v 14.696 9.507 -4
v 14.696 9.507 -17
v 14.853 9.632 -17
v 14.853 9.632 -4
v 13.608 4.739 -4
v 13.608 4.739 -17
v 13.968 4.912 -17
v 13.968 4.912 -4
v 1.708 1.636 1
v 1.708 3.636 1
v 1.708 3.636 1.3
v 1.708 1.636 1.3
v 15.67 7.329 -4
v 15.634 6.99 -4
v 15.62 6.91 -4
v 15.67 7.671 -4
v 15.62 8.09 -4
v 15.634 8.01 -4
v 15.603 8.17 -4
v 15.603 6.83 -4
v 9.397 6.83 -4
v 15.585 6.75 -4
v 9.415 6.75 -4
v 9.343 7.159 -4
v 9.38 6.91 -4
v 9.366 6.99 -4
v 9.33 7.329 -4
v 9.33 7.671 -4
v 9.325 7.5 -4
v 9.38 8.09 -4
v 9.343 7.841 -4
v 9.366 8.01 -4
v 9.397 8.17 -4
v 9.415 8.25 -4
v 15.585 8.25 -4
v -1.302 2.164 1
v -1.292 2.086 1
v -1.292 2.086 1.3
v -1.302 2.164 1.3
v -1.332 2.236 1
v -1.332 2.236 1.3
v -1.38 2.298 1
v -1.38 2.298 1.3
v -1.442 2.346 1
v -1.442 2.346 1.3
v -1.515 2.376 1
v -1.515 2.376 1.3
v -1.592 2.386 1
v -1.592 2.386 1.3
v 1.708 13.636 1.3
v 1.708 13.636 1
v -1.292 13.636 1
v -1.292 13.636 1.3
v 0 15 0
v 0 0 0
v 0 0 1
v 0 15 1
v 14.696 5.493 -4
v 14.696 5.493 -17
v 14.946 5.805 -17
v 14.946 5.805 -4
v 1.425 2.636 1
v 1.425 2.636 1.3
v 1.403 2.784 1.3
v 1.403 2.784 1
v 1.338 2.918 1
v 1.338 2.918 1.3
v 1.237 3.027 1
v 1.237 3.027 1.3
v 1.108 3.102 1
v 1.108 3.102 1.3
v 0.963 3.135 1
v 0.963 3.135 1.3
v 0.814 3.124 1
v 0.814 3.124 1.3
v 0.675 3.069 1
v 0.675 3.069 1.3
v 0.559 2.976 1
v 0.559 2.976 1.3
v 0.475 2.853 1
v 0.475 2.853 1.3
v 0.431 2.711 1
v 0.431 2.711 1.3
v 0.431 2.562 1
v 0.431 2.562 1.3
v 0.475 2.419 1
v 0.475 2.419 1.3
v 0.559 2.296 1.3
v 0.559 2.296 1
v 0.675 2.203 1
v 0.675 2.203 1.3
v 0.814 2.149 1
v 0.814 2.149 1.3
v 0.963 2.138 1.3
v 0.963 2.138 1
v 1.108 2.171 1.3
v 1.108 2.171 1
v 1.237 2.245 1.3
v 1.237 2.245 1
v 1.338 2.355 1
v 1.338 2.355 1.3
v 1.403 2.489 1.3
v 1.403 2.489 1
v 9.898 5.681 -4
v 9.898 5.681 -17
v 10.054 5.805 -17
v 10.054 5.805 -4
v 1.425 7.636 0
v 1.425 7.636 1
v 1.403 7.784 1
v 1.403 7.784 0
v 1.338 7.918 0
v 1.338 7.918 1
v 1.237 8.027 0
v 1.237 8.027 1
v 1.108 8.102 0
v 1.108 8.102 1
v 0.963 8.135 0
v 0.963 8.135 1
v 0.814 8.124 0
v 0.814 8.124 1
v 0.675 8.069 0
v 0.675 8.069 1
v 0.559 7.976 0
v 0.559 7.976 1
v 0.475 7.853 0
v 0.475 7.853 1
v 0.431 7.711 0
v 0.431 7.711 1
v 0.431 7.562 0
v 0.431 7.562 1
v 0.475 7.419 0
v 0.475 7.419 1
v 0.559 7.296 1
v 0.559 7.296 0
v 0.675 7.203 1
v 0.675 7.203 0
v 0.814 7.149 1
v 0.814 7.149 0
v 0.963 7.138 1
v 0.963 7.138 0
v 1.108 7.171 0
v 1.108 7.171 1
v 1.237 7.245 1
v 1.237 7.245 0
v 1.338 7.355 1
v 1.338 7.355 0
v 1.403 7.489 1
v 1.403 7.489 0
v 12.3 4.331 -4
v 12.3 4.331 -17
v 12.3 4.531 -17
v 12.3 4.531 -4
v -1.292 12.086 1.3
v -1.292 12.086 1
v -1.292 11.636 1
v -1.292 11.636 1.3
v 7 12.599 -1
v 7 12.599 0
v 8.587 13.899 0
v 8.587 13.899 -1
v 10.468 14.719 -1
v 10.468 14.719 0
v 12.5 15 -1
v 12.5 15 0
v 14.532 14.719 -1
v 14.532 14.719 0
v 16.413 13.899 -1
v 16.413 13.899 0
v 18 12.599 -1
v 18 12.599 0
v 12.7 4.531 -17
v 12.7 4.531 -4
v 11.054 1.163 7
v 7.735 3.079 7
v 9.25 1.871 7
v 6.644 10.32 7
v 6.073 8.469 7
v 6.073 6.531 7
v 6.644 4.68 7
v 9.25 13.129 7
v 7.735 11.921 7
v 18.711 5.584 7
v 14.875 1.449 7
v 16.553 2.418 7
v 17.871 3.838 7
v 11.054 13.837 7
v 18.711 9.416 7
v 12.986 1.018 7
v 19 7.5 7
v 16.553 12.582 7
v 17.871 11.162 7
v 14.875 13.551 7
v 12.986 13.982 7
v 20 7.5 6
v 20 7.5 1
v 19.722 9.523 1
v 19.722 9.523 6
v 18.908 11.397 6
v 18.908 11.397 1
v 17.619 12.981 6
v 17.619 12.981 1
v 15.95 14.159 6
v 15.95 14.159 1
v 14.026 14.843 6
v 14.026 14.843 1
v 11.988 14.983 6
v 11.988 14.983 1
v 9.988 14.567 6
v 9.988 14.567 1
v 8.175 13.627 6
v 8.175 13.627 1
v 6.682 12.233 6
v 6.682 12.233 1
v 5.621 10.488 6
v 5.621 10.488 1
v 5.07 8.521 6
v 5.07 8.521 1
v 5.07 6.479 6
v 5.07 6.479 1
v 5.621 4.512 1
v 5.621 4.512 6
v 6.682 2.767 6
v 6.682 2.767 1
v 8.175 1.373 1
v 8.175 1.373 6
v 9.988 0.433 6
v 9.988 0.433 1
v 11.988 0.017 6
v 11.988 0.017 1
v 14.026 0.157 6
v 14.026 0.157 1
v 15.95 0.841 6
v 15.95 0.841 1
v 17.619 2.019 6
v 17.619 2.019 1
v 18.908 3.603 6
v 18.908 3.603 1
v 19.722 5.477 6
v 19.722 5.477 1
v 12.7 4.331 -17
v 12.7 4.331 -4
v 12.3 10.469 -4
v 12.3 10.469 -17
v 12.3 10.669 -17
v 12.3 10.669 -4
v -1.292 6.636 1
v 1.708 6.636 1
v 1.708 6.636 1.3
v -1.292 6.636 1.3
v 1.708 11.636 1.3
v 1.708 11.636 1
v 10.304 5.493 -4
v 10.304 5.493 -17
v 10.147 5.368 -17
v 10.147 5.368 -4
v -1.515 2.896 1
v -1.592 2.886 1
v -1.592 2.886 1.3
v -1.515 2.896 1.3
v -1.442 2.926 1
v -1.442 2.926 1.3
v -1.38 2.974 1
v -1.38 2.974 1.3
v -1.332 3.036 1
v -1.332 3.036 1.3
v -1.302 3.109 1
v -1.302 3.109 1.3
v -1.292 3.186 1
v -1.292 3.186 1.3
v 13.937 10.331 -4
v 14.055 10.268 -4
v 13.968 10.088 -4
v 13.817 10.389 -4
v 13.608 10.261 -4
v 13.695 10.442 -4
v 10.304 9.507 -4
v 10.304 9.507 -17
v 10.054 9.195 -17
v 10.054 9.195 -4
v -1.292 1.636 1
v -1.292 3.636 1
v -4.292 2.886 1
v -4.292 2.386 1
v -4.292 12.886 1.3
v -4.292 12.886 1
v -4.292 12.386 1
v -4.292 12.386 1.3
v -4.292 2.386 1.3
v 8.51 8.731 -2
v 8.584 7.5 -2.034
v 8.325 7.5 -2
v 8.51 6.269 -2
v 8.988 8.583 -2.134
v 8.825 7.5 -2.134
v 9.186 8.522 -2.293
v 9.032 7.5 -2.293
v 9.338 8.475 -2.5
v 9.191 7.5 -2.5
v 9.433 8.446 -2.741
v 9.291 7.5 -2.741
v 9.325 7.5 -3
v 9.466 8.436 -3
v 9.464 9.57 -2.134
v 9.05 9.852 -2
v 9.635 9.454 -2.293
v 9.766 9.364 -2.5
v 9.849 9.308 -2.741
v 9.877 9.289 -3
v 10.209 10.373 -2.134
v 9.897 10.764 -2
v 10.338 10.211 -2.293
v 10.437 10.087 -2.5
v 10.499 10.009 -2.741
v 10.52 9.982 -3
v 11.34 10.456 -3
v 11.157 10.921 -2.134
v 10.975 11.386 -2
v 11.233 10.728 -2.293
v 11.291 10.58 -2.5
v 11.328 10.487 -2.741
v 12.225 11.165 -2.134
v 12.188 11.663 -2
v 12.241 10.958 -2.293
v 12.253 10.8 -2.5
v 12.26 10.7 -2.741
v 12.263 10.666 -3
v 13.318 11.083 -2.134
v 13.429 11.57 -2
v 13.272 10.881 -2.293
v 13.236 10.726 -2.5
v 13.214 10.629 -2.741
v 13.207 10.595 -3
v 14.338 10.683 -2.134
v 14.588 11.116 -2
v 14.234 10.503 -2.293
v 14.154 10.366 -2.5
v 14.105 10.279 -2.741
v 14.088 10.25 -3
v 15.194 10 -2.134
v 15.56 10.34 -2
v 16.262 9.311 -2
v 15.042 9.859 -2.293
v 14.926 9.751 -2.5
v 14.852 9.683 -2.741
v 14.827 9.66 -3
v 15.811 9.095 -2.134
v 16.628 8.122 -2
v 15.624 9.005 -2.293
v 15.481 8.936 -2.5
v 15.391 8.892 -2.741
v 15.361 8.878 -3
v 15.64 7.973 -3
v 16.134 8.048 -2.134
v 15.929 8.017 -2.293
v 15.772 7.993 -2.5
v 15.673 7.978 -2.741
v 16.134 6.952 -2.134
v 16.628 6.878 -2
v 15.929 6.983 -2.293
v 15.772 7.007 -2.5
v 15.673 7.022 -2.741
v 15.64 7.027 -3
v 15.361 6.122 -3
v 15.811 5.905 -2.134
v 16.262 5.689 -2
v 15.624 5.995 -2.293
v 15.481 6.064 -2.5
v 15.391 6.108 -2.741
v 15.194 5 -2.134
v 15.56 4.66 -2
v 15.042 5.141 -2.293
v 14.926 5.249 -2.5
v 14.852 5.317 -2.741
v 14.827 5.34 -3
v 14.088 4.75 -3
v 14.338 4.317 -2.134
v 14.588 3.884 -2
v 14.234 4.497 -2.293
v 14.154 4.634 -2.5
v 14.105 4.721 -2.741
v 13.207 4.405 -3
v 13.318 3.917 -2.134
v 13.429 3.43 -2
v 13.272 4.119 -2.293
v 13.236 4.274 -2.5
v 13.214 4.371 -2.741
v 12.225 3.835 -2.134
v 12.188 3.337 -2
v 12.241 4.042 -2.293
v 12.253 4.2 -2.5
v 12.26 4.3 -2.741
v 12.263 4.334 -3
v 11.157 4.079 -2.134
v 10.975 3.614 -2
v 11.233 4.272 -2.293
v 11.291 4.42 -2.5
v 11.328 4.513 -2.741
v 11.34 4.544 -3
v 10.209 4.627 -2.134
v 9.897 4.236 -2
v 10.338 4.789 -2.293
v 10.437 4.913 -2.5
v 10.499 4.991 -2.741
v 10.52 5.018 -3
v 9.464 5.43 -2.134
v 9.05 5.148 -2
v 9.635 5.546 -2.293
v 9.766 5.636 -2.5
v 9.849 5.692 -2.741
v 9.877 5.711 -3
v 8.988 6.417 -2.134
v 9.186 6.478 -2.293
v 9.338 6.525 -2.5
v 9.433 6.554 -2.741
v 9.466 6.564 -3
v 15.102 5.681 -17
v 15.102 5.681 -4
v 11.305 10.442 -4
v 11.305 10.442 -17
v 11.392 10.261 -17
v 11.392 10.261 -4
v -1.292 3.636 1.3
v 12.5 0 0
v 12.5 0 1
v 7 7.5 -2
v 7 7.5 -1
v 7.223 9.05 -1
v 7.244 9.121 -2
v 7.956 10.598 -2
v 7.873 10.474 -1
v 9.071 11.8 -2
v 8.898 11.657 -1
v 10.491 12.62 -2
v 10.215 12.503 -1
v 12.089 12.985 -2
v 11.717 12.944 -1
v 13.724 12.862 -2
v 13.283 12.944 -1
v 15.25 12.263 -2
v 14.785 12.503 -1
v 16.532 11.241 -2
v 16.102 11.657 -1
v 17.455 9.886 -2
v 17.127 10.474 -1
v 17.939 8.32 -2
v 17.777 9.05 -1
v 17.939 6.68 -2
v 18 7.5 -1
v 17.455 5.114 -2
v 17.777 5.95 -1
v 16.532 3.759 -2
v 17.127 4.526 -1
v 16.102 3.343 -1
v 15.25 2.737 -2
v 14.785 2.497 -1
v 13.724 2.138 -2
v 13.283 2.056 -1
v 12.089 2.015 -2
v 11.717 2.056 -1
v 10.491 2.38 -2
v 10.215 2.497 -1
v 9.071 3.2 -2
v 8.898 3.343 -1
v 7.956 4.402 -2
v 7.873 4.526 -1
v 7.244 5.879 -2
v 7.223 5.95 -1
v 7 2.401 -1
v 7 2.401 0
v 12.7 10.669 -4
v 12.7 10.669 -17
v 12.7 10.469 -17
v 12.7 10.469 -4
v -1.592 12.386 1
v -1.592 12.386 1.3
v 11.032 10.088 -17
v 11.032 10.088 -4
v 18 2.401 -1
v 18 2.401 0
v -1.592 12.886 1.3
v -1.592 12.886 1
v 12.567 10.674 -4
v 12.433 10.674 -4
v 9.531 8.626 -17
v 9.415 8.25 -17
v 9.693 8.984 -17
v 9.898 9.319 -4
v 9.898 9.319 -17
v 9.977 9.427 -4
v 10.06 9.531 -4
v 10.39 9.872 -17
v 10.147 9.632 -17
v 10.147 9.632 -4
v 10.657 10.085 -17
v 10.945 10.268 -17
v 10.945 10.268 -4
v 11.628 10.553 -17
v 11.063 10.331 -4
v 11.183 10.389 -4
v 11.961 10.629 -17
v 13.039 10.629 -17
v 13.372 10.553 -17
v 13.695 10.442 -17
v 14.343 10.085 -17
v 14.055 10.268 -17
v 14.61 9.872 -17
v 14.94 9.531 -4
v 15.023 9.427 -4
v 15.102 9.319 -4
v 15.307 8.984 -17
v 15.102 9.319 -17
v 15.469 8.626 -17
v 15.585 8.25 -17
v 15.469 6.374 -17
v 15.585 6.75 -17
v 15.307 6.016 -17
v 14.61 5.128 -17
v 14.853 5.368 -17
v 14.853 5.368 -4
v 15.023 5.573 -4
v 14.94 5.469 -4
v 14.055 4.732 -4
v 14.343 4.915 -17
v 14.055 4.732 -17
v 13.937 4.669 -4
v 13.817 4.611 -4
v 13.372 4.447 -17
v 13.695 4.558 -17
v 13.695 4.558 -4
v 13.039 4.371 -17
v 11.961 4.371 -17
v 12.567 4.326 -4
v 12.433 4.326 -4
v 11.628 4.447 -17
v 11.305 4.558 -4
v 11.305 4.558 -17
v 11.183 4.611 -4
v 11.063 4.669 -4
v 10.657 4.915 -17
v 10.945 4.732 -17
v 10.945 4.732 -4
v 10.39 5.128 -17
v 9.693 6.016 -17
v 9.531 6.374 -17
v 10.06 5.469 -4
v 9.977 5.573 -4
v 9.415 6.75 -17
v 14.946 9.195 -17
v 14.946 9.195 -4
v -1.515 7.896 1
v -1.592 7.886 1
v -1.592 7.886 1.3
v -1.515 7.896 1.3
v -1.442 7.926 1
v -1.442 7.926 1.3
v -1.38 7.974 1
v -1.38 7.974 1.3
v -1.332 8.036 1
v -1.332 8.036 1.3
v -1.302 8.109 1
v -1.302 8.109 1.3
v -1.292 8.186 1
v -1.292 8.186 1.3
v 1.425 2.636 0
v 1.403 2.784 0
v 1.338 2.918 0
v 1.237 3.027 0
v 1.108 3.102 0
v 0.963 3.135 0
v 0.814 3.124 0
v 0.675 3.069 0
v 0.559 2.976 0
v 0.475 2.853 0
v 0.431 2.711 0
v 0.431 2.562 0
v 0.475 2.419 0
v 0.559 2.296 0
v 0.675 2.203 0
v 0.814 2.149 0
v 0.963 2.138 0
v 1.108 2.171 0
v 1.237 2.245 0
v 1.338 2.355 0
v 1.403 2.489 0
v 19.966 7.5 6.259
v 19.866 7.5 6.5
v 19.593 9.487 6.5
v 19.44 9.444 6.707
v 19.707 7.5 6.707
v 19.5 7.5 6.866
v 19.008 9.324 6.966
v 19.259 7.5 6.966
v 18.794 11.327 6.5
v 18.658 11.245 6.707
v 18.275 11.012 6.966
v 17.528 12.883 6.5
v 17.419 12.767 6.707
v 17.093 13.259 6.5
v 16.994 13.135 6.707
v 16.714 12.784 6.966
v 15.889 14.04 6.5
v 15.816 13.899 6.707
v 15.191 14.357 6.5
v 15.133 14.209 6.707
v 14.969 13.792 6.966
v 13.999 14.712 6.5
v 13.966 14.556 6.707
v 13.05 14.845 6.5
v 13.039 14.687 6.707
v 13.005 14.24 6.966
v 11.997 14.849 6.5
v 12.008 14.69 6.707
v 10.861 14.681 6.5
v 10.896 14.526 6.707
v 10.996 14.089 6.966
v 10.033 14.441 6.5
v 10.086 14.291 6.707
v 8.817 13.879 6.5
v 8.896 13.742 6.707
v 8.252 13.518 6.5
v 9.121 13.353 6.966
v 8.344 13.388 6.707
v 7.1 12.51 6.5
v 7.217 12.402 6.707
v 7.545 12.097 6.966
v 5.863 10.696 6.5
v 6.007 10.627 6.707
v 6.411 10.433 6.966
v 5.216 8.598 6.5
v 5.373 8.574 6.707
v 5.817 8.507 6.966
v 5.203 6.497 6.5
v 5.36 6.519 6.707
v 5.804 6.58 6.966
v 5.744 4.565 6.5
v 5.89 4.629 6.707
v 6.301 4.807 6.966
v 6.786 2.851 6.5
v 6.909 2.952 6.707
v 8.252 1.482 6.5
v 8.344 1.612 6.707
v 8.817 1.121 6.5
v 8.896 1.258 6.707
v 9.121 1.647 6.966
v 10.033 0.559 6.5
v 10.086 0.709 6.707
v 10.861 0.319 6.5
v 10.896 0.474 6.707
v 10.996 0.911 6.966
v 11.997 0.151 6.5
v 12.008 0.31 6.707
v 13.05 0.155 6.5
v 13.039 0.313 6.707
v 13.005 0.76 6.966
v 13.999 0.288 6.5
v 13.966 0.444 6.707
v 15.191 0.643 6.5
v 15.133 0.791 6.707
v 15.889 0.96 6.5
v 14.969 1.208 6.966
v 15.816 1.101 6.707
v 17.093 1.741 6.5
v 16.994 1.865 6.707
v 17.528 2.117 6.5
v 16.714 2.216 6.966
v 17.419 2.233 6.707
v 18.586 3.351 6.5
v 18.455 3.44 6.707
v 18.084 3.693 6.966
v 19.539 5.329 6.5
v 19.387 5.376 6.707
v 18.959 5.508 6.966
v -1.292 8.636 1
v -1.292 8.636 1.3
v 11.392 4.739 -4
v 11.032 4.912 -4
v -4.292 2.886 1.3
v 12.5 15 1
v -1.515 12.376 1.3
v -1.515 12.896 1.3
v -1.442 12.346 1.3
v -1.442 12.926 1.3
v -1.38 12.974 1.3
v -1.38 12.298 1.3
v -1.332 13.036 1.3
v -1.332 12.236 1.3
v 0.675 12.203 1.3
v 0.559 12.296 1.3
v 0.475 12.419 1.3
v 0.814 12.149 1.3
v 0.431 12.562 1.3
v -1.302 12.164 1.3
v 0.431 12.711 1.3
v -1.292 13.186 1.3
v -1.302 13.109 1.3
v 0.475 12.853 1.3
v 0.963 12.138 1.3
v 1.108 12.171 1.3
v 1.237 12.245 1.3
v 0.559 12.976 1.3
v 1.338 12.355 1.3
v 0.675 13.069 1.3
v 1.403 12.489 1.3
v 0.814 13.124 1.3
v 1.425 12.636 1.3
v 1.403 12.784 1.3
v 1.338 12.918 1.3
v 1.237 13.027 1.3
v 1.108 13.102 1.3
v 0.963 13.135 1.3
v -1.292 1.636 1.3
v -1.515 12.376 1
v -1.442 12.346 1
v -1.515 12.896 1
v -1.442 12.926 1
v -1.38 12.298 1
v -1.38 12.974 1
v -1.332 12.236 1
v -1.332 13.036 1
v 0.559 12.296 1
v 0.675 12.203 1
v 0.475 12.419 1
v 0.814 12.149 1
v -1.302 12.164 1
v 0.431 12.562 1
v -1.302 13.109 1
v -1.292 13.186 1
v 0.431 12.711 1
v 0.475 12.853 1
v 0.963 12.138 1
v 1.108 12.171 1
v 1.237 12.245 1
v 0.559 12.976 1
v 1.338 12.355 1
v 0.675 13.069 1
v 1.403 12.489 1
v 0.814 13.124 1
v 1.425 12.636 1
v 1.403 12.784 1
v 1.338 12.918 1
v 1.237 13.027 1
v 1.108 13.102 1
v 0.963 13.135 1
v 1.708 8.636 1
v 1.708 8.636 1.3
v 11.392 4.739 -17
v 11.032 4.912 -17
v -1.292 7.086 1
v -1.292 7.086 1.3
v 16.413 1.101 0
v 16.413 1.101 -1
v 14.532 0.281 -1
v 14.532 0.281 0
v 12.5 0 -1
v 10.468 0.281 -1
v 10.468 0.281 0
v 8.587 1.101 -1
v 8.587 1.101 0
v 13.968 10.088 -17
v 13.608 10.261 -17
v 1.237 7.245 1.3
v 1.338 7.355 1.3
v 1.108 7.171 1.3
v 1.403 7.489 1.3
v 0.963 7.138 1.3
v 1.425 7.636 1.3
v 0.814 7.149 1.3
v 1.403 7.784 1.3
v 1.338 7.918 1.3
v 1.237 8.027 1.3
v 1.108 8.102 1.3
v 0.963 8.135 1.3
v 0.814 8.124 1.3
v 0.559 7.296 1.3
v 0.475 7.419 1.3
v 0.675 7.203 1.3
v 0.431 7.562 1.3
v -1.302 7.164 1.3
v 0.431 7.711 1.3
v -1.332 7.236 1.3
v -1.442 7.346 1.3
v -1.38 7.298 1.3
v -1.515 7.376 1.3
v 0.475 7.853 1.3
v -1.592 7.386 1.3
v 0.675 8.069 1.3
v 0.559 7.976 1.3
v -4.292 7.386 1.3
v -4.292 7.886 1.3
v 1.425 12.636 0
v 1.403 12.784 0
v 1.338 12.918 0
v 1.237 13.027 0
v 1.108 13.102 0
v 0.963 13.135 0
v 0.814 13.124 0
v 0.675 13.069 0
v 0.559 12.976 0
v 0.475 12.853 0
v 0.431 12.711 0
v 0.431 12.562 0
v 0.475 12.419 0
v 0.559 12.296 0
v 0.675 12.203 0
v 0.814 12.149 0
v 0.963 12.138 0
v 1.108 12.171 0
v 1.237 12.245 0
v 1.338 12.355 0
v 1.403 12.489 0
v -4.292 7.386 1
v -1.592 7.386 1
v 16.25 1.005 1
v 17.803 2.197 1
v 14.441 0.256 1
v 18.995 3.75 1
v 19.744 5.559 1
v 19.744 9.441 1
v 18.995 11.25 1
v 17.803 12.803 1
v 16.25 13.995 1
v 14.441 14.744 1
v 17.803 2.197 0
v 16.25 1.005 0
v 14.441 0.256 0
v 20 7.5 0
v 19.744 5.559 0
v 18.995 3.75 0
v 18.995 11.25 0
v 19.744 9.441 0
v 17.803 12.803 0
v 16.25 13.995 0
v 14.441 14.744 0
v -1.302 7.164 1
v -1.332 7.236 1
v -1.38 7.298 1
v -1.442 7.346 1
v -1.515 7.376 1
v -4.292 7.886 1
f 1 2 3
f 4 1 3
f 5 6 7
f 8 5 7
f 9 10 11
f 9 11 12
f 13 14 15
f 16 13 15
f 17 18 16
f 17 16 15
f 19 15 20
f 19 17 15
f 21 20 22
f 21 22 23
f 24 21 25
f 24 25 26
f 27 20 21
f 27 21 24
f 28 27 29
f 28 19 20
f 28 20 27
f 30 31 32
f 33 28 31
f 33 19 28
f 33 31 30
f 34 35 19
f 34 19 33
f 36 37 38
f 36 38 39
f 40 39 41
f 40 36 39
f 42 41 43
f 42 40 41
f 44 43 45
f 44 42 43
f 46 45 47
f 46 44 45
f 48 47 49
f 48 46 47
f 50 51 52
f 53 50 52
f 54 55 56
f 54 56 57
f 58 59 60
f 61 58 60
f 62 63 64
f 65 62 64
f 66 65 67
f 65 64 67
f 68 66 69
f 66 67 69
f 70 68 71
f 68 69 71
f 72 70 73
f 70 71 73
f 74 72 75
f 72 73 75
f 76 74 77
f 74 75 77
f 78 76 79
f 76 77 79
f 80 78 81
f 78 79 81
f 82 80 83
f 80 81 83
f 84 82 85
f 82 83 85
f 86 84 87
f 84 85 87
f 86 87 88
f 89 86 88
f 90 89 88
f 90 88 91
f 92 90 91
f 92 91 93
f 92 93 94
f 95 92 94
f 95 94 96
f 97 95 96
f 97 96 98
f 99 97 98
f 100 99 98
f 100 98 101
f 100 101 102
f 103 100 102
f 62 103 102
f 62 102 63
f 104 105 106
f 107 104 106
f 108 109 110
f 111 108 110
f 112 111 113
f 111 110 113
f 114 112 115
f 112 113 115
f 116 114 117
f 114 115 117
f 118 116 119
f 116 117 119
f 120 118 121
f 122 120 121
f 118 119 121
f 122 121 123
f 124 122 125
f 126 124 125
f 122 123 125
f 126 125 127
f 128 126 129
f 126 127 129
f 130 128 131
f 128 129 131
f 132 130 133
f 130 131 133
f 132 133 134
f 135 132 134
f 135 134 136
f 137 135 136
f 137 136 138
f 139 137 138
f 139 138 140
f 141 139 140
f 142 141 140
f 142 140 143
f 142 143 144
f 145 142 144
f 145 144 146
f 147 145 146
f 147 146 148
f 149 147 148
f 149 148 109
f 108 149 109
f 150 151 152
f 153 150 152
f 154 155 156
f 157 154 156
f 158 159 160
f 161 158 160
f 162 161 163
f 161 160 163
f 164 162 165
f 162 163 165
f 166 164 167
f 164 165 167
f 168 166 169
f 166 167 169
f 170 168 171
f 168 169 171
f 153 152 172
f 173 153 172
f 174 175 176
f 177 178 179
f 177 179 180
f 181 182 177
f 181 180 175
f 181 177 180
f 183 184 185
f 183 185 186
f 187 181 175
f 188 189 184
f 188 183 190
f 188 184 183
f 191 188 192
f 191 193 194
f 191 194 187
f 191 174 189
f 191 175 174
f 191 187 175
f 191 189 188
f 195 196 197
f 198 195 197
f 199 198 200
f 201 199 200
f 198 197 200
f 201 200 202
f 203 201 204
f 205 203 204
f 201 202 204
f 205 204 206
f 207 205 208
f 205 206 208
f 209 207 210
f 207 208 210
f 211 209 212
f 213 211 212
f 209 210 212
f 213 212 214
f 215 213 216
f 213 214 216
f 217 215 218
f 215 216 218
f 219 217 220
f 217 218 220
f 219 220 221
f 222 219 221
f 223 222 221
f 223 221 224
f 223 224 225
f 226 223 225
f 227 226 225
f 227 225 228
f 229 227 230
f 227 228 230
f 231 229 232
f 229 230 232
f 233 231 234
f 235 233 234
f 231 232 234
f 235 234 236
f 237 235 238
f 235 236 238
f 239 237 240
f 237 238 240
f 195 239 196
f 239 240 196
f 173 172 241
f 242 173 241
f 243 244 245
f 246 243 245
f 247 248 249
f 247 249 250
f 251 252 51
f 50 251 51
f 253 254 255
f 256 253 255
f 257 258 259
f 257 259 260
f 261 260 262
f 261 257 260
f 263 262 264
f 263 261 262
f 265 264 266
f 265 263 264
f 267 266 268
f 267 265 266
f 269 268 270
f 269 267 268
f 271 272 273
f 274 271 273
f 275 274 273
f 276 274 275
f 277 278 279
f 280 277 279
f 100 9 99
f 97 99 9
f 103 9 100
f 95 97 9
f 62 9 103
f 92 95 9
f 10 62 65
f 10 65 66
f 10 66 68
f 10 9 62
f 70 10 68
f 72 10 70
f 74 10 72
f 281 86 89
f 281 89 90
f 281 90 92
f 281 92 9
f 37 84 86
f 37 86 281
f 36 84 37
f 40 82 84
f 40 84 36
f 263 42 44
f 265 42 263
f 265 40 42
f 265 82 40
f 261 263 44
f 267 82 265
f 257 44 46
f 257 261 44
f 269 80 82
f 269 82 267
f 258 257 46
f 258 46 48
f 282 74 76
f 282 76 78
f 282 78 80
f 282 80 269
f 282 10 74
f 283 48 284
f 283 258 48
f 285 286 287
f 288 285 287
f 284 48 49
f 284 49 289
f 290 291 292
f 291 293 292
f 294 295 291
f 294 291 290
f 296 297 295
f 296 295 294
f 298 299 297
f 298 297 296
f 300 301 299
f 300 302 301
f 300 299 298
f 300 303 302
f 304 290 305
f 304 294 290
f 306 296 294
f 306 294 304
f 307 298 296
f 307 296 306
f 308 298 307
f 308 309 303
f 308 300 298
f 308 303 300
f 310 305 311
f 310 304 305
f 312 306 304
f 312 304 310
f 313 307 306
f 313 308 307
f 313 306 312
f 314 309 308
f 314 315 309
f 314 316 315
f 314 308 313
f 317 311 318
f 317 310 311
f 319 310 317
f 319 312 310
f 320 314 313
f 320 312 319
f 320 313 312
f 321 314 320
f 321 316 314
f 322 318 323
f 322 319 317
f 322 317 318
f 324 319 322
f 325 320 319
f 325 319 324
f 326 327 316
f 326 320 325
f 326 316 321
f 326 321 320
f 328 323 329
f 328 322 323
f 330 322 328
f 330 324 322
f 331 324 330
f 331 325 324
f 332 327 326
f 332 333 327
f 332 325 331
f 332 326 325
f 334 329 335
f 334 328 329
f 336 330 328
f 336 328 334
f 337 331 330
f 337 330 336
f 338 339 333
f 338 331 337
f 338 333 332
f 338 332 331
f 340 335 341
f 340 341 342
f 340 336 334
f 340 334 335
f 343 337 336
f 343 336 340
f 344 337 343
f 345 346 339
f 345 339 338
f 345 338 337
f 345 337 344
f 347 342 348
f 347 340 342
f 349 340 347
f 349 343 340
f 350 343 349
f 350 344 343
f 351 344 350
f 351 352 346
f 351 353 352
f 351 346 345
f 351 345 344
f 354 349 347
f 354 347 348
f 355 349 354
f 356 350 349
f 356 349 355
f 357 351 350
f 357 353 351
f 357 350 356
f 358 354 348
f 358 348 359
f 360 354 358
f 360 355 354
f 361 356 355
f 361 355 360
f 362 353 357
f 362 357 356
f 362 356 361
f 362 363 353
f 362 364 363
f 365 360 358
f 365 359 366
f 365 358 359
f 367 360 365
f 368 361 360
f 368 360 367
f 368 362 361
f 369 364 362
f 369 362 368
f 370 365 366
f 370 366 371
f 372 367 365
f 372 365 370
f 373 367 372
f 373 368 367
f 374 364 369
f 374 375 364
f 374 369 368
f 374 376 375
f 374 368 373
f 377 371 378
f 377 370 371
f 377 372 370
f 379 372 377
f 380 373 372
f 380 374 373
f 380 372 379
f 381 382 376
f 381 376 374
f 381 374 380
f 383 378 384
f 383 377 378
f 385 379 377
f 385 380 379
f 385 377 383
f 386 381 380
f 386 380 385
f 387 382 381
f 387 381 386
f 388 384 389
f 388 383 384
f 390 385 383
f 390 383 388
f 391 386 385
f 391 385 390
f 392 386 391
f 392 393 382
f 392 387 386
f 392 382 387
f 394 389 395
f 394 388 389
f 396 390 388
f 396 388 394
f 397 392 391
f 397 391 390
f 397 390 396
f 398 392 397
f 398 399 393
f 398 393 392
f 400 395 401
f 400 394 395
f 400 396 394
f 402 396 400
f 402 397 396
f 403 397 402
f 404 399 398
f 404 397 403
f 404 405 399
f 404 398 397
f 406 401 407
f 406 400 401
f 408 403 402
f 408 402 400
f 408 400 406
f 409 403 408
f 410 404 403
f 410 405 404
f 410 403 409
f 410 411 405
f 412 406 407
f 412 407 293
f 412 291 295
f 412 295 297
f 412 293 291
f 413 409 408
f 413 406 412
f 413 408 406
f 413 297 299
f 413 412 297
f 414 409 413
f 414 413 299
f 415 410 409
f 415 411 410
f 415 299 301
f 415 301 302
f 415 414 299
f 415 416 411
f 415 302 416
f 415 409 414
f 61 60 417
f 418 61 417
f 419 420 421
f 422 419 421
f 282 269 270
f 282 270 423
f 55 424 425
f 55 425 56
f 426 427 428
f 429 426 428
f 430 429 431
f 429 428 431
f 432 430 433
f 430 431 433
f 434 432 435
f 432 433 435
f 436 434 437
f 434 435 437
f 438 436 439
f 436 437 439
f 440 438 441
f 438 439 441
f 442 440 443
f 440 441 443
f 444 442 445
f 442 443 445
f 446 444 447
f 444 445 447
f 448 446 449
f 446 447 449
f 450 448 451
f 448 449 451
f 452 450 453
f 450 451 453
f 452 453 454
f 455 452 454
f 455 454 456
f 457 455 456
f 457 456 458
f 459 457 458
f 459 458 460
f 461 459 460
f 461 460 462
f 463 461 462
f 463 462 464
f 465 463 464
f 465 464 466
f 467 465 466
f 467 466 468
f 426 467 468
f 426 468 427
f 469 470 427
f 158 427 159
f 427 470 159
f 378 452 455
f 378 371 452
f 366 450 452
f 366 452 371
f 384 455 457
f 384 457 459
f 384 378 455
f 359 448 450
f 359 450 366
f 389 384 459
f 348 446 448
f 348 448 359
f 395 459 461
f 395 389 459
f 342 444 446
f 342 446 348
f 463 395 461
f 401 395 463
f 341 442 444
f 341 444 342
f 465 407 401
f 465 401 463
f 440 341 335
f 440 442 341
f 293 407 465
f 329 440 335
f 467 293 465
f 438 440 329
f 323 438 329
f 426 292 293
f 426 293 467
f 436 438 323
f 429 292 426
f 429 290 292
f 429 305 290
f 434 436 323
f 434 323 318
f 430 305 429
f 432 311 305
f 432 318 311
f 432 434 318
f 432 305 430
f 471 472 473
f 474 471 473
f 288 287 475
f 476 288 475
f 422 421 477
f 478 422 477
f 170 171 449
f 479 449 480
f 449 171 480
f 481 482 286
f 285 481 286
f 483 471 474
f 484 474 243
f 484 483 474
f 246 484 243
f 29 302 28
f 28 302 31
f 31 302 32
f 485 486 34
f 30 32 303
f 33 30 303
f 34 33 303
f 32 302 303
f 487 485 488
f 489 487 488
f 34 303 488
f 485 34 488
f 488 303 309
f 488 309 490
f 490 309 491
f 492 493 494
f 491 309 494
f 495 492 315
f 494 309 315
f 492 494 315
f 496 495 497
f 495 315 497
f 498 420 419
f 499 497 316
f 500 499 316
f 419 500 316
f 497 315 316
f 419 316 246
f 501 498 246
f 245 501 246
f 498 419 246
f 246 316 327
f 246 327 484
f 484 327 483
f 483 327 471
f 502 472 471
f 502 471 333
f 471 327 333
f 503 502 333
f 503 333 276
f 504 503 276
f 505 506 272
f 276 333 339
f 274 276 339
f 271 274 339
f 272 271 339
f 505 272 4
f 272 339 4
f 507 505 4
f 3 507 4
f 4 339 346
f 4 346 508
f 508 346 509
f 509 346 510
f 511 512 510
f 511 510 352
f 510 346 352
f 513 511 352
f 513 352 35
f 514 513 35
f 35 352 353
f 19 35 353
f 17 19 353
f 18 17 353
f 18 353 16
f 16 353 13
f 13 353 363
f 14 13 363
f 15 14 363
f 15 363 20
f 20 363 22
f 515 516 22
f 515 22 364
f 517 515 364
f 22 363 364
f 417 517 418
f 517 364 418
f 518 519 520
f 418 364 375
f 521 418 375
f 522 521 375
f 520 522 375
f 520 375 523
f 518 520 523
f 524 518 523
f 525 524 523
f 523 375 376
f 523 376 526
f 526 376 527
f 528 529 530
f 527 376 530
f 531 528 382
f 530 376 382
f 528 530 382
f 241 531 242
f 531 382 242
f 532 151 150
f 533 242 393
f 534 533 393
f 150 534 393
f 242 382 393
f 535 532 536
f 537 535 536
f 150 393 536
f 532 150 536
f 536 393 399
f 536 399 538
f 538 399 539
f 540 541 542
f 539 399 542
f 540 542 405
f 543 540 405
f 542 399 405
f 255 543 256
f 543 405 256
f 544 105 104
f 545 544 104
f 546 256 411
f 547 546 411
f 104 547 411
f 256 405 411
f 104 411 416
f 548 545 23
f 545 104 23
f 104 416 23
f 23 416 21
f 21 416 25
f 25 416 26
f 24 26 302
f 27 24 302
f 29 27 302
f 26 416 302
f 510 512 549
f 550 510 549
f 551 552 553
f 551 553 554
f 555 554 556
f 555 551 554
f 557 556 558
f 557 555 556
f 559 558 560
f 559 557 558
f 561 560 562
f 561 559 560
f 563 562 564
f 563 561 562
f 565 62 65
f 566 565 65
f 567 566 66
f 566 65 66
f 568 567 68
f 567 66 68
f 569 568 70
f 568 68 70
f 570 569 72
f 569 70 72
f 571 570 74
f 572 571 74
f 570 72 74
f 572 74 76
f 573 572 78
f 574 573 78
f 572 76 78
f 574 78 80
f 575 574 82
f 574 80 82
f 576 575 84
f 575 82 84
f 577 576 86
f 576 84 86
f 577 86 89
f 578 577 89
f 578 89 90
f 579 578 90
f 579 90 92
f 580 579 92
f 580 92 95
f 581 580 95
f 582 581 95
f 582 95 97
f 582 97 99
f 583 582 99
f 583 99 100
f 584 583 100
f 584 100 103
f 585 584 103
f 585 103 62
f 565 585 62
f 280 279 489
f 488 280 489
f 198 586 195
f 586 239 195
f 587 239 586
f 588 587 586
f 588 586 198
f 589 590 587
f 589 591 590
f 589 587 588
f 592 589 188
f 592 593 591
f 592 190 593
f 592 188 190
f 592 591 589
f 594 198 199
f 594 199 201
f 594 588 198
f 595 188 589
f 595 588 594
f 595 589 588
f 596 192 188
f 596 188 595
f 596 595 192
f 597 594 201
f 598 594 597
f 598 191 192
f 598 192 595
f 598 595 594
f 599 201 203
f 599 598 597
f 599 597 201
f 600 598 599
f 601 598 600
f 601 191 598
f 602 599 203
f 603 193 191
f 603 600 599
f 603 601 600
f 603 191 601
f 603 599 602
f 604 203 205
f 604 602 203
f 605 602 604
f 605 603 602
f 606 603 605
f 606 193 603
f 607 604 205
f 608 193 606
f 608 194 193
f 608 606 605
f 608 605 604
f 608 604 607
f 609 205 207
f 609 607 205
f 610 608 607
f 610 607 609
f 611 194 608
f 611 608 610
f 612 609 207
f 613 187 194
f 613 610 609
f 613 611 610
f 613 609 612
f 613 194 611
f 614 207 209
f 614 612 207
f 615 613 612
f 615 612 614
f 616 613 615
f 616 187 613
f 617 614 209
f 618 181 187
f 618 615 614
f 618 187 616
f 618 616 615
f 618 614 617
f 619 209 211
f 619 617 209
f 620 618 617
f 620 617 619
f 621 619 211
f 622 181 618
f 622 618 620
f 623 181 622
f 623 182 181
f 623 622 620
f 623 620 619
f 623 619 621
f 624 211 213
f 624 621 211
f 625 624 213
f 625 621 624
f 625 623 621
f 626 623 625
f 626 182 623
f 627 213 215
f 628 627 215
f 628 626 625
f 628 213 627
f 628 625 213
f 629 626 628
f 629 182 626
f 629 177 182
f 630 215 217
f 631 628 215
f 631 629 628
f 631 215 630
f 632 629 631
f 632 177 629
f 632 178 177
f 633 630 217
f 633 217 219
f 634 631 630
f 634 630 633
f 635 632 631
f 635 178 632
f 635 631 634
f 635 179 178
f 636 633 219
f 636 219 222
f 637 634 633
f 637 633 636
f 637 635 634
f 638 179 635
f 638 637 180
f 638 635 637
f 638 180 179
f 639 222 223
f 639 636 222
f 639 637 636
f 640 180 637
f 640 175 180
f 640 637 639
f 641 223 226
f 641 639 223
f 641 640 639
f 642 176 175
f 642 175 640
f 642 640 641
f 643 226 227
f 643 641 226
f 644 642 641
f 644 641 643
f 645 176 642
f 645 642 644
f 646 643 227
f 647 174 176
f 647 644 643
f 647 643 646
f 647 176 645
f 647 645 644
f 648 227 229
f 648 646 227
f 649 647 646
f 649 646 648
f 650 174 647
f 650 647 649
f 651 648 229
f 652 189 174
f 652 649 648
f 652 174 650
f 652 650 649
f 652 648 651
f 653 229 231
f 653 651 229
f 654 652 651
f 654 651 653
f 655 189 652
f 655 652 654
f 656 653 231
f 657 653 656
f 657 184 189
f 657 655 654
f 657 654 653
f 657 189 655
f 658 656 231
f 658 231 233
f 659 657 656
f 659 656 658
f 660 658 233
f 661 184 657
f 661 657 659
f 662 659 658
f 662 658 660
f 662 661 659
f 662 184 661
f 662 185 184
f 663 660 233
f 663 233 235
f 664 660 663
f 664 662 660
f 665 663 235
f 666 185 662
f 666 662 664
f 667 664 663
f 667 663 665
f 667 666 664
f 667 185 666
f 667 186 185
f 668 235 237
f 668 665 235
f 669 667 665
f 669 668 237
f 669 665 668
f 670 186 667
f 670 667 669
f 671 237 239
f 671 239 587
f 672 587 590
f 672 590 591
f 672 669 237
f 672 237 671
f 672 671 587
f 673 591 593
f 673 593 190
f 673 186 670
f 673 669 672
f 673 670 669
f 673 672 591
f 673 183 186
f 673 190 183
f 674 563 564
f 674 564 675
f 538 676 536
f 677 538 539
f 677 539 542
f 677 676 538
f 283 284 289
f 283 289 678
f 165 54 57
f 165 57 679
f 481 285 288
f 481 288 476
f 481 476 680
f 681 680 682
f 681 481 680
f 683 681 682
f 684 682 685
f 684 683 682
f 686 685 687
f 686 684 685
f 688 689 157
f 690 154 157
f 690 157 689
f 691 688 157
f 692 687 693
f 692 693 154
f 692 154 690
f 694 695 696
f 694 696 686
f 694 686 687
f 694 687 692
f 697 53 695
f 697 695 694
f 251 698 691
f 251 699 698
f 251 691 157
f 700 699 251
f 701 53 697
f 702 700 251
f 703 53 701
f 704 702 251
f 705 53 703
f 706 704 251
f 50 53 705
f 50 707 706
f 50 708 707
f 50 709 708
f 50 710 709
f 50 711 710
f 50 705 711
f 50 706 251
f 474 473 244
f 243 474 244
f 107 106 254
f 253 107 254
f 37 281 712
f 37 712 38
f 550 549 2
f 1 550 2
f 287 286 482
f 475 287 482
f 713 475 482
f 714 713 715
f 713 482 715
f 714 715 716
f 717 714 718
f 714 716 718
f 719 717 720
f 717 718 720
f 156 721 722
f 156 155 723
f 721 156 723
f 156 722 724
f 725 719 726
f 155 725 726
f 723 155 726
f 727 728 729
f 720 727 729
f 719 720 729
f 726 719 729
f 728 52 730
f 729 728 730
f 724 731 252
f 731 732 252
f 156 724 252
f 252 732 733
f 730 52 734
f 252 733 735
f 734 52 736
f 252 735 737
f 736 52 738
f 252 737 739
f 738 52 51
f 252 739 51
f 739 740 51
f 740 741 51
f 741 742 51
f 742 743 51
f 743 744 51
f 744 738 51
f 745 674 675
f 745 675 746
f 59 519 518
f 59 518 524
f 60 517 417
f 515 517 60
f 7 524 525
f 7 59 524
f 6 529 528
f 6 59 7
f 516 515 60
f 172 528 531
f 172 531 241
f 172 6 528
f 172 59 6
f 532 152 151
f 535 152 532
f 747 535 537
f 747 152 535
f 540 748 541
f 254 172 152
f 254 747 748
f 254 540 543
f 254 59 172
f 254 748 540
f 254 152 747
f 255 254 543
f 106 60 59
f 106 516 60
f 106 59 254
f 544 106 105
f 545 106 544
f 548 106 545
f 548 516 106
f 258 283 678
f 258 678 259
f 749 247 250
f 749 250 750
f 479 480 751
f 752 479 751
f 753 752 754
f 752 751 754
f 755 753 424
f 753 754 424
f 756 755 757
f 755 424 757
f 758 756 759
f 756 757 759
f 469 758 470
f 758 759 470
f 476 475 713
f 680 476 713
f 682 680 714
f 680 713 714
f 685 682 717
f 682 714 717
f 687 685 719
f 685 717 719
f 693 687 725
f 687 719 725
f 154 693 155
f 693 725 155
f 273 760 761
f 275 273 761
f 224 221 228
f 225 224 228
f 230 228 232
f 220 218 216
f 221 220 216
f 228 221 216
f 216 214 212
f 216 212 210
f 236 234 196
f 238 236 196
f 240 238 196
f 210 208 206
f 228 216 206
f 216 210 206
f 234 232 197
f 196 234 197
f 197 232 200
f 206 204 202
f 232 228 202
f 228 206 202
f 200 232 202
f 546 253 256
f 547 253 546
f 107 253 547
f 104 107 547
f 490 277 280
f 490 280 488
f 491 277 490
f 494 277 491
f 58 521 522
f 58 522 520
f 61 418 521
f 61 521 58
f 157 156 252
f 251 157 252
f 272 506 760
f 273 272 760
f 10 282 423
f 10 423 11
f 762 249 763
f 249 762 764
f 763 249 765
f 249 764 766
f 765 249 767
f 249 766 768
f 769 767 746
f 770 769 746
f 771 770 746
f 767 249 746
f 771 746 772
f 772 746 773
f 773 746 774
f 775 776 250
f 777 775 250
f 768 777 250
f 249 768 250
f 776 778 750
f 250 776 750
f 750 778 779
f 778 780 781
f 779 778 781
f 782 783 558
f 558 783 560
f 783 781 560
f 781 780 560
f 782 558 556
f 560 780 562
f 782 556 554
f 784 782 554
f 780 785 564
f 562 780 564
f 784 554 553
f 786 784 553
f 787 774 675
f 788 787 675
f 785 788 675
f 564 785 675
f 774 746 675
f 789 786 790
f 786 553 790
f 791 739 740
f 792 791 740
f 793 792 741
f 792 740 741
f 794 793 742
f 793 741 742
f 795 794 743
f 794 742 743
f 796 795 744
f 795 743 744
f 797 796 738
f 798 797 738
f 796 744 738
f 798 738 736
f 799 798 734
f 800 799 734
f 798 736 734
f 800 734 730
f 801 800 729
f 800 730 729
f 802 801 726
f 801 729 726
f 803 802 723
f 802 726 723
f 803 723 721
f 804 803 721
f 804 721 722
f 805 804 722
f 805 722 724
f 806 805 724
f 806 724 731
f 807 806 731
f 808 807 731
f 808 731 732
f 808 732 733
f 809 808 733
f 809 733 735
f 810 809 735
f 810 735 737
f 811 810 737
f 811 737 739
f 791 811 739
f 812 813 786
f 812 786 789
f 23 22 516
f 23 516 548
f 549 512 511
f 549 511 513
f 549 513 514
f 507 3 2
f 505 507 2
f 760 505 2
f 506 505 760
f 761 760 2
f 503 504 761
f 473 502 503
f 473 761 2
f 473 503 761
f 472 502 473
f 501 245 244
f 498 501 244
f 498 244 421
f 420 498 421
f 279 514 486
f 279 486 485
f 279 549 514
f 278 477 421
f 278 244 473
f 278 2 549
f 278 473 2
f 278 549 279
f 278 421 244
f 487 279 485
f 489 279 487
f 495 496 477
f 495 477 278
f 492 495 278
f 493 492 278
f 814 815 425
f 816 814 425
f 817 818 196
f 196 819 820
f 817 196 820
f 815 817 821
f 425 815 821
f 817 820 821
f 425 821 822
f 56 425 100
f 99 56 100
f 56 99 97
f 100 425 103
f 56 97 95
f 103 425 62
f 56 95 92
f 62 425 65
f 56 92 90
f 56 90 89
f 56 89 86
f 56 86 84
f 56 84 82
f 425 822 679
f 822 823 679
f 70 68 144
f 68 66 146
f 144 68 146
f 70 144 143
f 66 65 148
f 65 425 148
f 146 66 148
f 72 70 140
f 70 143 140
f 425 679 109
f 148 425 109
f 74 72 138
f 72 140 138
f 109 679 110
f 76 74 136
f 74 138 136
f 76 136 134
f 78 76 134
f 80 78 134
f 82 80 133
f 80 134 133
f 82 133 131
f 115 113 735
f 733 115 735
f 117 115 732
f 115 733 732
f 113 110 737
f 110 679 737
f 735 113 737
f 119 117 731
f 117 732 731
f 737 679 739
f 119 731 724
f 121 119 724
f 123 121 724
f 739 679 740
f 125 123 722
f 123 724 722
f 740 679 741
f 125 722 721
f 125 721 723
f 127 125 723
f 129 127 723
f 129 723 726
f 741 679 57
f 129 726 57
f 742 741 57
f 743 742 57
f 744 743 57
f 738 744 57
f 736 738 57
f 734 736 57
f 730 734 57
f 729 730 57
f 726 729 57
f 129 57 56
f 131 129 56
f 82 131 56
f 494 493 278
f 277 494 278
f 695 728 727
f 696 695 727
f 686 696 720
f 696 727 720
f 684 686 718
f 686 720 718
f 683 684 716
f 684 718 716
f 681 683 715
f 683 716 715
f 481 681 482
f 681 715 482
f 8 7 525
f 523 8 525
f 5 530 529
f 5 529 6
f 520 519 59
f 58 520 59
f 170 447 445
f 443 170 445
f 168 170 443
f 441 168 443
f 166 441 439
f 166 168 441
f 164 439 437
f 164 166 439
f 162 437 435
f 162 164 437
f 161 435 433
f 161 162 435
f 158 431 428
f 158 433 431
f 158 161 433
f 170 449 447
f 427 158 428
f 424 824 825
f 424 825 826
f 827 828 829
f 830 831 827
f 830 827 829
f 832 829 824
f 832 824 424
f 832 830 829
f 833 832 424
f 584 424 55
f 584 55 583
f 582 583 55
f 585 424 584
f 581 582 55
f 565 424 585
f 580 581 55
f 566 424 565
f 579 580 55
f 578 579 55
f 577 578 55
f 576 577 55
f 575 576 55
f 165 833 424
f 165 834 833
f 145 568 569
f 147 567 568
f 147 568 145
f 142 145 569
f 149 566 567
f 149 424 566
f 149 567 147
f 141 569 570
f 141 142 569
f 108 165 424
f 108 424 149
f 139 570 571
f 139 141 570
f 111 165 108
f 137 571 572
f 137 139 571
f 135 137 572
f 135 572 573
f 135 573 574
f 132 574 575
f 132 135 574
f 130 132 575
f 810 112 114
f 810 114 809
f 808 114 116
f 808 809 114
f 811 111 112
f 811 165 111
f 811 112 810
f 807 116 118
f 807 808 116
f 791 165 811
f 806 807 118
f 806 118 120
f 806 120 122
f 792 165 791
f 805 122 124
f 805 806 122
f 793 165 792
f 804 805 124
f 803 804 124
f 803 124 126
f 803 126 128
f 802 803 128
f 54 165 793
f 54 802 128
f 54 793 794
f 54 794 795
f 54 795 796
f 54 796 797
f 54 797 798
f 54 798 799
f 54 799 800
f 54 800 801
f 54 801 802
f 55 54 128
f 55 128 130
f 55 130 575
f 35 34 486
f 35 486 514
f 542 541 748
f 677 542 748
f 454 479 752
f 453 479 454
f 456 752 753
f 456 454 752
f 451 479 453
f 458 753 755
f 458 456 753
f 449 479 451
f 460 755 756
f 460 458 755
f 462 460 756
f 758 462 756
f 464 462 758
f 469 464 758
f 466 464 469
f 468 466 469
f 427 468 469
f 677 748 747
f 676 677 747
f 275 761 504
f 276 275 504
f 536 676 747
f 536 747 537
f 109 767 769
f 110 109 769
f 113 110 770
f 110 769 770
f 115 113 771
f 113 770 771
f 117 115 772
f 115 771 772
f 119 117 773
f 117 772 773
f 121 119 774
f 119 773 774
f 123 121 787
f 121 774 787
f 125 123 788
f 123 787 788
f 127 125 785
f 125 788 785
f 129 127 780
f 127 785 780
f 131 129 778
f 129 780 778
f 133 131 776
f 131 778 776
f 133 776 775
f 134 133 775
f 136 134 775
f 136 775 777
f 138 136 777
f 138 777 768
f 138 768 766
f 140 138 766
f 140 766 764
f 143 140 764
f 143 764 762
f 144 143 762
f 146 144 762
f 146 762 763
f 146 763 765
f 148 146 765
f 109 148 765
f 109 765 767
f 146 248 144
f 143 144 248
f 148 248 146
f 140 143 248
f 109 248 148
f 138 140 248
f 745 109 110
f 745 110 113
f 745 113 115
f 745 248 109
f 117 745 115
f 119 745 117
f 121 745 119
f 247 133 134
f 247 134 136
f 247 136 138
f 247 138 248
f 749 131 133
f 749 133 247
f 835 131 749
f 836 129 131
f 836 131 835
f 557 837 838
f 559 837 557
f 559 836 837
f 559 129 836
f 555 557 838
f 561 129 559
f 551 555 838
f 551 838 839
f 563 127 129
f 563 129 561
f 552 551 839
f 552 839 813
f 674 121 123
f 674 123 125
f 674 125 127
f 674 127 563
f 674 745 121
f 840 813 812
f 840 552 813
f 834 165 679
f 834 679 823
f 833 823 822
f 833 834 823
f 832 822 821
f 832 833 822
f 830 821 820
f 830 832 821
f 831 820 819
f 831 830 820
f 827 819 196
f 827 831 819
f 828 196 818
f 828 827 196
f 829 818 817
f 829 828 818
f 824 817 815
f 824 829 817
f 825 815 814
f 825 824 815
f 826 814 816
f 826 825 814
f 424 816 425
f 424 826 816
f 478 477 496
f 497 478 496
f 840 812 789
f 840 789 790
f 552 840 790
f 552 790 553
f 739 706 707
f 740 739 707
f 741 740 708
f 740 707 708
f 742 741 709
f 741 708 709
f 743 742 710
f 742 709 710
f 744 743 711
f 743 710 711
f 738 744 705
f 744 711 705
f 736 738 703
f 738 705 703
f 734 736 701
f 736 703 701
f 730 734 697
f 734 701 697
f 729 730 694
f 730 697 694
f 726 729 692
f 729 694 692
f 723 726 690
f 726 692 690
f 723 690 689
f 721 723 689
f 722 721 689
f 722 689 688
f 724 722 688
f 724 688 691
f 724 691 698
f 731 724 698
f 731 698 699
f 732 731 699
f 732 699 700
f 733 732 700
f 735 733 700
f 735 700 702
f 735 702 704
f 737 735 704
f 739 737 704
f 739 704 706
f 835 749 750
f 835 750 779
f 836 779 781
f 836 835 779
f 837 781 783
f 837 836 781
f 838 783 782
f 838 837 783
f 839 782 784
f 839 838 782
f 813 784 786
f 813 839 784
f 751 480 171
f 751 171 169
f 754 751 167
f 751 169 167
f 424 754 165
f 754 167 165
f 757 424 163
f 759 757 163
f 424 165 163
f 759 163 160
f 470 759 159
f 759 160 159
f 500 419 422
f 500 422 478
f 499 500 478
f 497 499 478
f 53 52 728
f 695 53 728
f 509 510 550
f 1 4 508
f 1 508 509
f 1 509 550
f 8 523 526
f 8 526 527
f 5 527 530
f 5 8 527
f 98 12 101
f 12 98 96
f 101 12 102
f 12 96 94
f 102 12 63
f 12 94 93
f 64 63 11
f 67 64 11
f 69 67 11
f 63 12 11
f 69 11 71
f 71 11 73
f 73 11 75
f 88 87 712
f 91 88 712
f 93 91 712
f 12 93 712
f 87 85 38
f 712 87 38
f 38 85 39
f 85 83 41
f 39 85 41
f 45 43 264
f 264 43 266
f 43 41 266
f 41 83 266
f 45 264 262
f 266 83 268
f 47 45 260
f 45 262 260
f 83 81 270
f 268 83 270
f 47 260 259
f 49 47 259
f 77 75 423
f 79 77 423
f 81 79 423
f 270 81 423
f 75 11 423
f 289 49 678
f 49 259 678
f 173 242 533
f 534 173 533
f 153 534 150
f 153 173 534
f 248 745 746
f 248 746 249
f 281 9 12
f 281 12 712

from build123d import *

# Parameters (mm, degrees)
SALIENTE_EXTRUIR1_DEPTH   = 1
CROQUIS4_R                = 7.5
SALIENTE_EXTRUIR2_DEPTH   = 6
SALIENTE_EXTRUIR3_DEPTH   = 1
CROQUIS6_R                = 5.5
SALIENTE_EXTRUIR5_DEPTH   = 1
CROQUIS7_R                = 3.175
SALIENTE_EXTRUIR6_DEPTH   = 15
CORTAR_EXTRUIR1_DEPTH     = 13
SALIENTE_EXTRUIR7_DEPTH   = 0.3
SALIENTE_EXTRUIR7_2_DEPTH = 0.3
SALIENTE_EXTRUIR7_3_DEPTH = 0.3
CROQUIS11_R               = 0.5
CORTAR_EXTRUIR2_DEPTH     = 19.3
REDONDEO1_R               = 1
REDONDEO2_R               = 1


with BuildPart() as part:
    # Croquis3 → Saliente-Extruir1 (new body)
    with BuildSketch(Plane.XY):
        with BuildLine():
            Line((12.5, 0), (0, 0))
            Line((0, 0), (0, 15))
            Line((0, 15), (12.5, 15))
            ThreePointArc((12.5, 15), (20, 7.5), (12.5, 0))
        make_face()
    extrude(amount=SALIENTE_EXTRUIR1_DEPTH)


with BuildPart() as body_2:
    # Croquis4 → Saliente-Extruir2 (new body)
    with BuildSketch(Plane.XY.offset(1)):
        with Locations((12.5, 7.5)):
            Circle(CROQUIS4_R)
    extrude(amount=SALIENTE_EXTRUIR2_DEPTH)

    # Redondeo1
    redondeo1_edges = [body_2.edges().sort_by_distance(p)[0] for p in [
        (5, 7.5, 7),
    ]]
    fillet(redondeo1_edges, radius=REDONDEO1_R)


with BuildPart() as body_3:
    # Croquis5 → Saliente-Extruir3 (new body)
    with BuildSketch(Plane(origin=(0, 0, 0), x_dir=(-1, 0, 0), z_dir=(0, 0, -1))):
        with BuildLine():
            Line((-18, 12.599019514), (-18, 2.400980486))
            ThreePointArc((-18, 2.400980486), (-12.5, 0), (-7, 2.400980486))
            Line((-7, 2.400980486), (-7, 12.599019514))
            ThreePointArc((-7, 12.599019514), (-12.5, 15), (-18, 12.599019514))
        make_face()
    extrude(amount=SALIENTE_EXTRUIR3_DEPTH)

    # Croquis6 → Saliente-Extruir5 (add)
    with BuildSketch(Plane(origin=(0, 0, -1), x_dir=(-1, 0, 0), z_dir=(0, 0, -1))):
        with Locations((-12.5, 7.5)):
            Circle(CROQUIS6_R)
    extrude(amount=SALIENTE_EXTRUIR5_DEPTH)

    # Croquis7 → Saliente-Extruir6 (add)
    with BuildSketch(Plane(origin=(0, 0, -2), x_dir=(-1, 0, 0), z_dir=(0, 0, -1))):
        with Locations((-12.5, 7.5)):
            Circle(CROQUIS7_R)
    extrude(amount=SALIENTE_EXTRUIR6_DEPTH)

    # Croquis9 → Cortar-Extruir1 (cut)
    with BuildSketch(Plane(origin=(0, 0, -17), x_dir=(-1, 0, 0), z_dir=(0, 0, -1))):
        with BuildLine():
            Line((-9.626142568, 8.25), (-15.373857432, 8.25))
            Line((-15.373857432, 8.25), (-15.438767343, 7.965611096))
            Line((-15.438767343, 7.965611096), (-15.633752926, 8.010115283))
            ThreePointArc((-15.633752926, 8.010115283), (-15.675, 7.5), (-15.633752926, 6.989884717))
            Line((-15.633752926, 6.989884717), (-15.438767343, 7.034388904))
            Line((-15.438767343, 7.034388904), (-15.373857432, 6.75))
            Line((-15.373857432, 6.75), (-9.626142568, 6.75))
            Line((-9.626142568, 6.75), (-9.561232657, 7.034388904))
            Line((-9.561232657, 7.034388904), (-9.366247074, 6.989884717))
            ThreePointArc((-9.366247074, 6.989884717), (-9.335328569, 7.244109924), (-9.325, 7.5))
            ThreePointArc((-9.325, 7.5), (-9.335328569, 7.755890076), (-9.366247074, 8.010115283))
            Line((-9.366247074, 8.010115283), (-9.561232657, 7.965611096))
            Line((-9.561232657, 7.965611096), (-9.626142568, 8.25))
        make_face()
        with BuildLine():
            Line((-14.696320882, 9.507317058), (-14.852687178, 9.632015019))
            ThreePointArc((-14.852687178, 9.632015019), (-14.982314957, 9.479580121), (-15.102083099, 9.319282426))
            Line((-15.102083099, 9.319282426), (-14.945716803, 9.194584465))
            Line((-14.945716803, 9.194584465), (-14.696320882, 9.507317058))
        make_face()
        with BuildLine():
            Line((-13.607874508, 10.261478094), (-13.694651256, 10.441671868))
            ThreePointArc((-13.694651256, 10.441671868), (-13.877580872, 10.360576156), (-14.055038803, 10.268118372))
            Line((-14.055038803, 10.268118372), (-13.968262055, 10.087924599))
            Line((-13.968262055, 10.087924599), (-13.607874508, 10.261478094))
        make_face()
        with BuildLine():
            ThreePointArc((-12.3, 10.668694526), (-12.5, 10.675), (-12.7, 10.668694526))
            Line((-12.7, 10.668694526), (-12.7, 10.468694526))
            Line((-12.7, 10.468694526), (-12.3, 10.468694526))
            Line((-12.3, 10.468694526), (-12.3, 10.668694526))
        make_face()
        with BuildLine():
            ThreePointArc((-10.944961197, 10.268118372), (-11.122419128, 10.360576156), (-11.305348744, 10.441671868))
            Line((-11.305348744, 10.441671868), (-11.392125492, 10.261478094))
            Line((-11.392125492, 10.261478094), (-11.031737945, 10.087924599))
            Line((-11.031737945, 10.087924599), (-10.944961197, 10.268118372))
        make_face()
        with BuildLine():
            ThreePointArc((-9.897916901, 9.319282426), (-10.017685043, 9.479580121), (-10.147312822, 9.632015019))
            Line((-10.147312822, 9.632015019), (-10.303679118, 9.507317058))
            Line((-10.303679118, 9.507317058), (-10.054283197, 9.194584465))
            Line((-10.054283197, 9.194584465), (-9.897916901, 9.319282426))
        make_face()
        with BuildLine():
            Line((-14.945716803, 5.805415535), (-15.102083099, 5.680717574))
            ThreePointArc((-15.102083099, 5.680717574), (-14.982314957, 5.520419879), (-14.852687178, 5.367984981))
            Line((-14.852687178, 5.367984981), (-14.696320882, 5.492682942))
            Line((-14.696320882, 5.492682942), (-14.945716803, 5.805415535))
        make_face()
        with BuildLine():
            Line((-13.968262055, 4.912075401), (-14.055038803, 4.731881628))
            ThreePointArc((-14.055038803, 4.731881628), (-13.877580872, 4.639423844), (-13.694651256, 4.558328132))
            Line((-13.694651256, 4.558328132), (-13.607874508, 4.738521906))
            Line((-13.607874508, 4.738521906), (-13.968262055, 4.912075401))
        make_face()
        with BuildLine():
            ThreePointArc((-11.305348744, 4.558328132), (-11.122419128, 4.639423844), (-10.944961197, 4.731881628))
            Line((-10.944961197, 4.731881628), (-11.031737945, 4.912075401))
            Line((-11.031737945, 4.912075401), (-11.392125492, 4.738521906))
            Line((-11.392125492, 4.738521906), (-11.305348744, 4.558328132))
        make_face()
        with BuildLine():
            Line((-12.7, 4.531305474), (-12.7, 4.331305474))
            ThreePointArc((-12.7, 4.331305474), (-12.5, 4.325), (-12.3, 4.331305474))
            Line((-12.3, 4.331305474), (-12.3, 4.531305474))
            Line((-12.3, 4.531305474), (-12.7, 4.531305474))
        make_face()
        with BuildLine():
            ThreePointArc((-10.147312822, 5.367984981), (-10.017685043, 5.520419879), (-9.897916901, 5.680717574))
            Line((-9.897916901, 5.680717574), (-10.054283197, 5.805415535))
            Line((-10.054283197, 5.805415535), (-10.303679118, 5.492682942))
            Line((-10.303679118, 5.492682942), (-10.147312822, 5.367984981))
        make_face()
        with BuildLine():
            Line((-15.438767343, 7.034388904), (-15.633752926, 6.989884717))
            ThreePointArc((-15.633752926, 6.989884717), (-15.611761833, 6.869473797), (-15.585145864, 6.75))
            Line((-15.585145864, 6.75), (-15.373857432, 6.75))
            Line((-15.373857432, 6.75), (-15.438767343, 7.034388904))
        make_face()
        with BuildLine():
            ThreePointArc((-9.414854136, 6.75), (-9.388238167, 6.869473797), (-9.366247074, 6.989884717))
            Line((-9.366247074, 6.989884717), (-9.561232657, 7.034388904))
            Line((-9.561232657, 7.034388904), (-9.626142568, 6.75))
            Line((-9.626142568, 6.75), (-9.414854136, 6.75))
        make_face()
        with BuildLine():
            ThreePointArc((-9.366247074, 8.010115283), (-9.388238167, 8.130526203), (-9.414854136, 8.25))
            Line((-9.414854136, 8.25), (-9.626142568, 8.25))
            Line((-9.626142568, 8.25), (-9.561232657, 7.965611096))
            Line((-9.561232657, 7.965611096), (-9.366247074, 8.010115283))
        make_face()
        with BuildLine():
            Line((-15.373857432, 8.25), (-15.585145864, 8.25))
            ThreePointArc((-15.585145864, 8.25), (-15.611761833, 8.130526203), (-15.633752926, 8.010115283))
            Line((-15.633752926, 8.010115283), (-15.438767343, 7.965611096))
            Line((-15.438767343, 7.965611096), (-15.373857432, 8.25))
        make_face()
    extrude(amount=-CORTAR_EXTRUIR1_DEPTH, mode=Mode.SUBTRACT)

    # Redondeo2
    redondeo2_edges = [body_3.edges().sort_by_distance(p)[0] for p in [
        (15.675, 7.5, -2),
    ]]
    fillet(redondeo2_edges, radius=REDONDEO2_R)


with BuildPart() as body_4:
    # Croquis10 → Saliente-Extruir7 (new body)
    with BuildSketch(Plane.XY.offset(1)):
        with BuildLine():
            Line((1.707822632, 13.636249798), (-1.292177368, 13.636249798))
            Line((-1.292177368, 13.636249798), (-1.292177368, 13.186249798))
            ThreePointArc((-1.292177368, 13.186249798), (-1.380045334, 12.974117764), (-1.592177368, 12.886249798))
            Line((-1.592177368, 12.886249798), (-4.292177368, 12.886249798))
            Line((-4.292177368, 12.886249798), (-4.292177368, 12.386249798))
            Line((-4.292177368, 12.386249798), (-1.592177368, 12.386249798))
            ThreePointArc((-1.592177368, 12.386249798), (-1.380045334, 12.298381833), (-1.292177368, 12.086249798))
            Line((-1.292177368, 12.086249798), (-1.292177368, 11.636249798))
            Line((-1.292177368, 11.636249798), (1.707822632, 11.636249798))
            Line((1.707822632, 11.636249798), (1.707822632, 13.636249798))
        make_face()
    extrude(amount=SALIENTE_EXTRUIR7_DEPTH)


with BuildPart() as body_5:
    # Croquis10 → Saliente-Extruir7 2 (new body)
    with BuildSketch(Plane.XY.offset(1)):
        with BuildLine():
            Line((1.707822632, 6.636249798), (-1.292177368, 6.636249798))
            Line((-1.292177368, 6.636249798), (-1.292177368, 7.086249798))
            ThreePointArc((-1.292177368, 7.086249798), (-1.380045334, 7.298381833), (-1.592177368, 7.386249798))
            Line((-1.592177368, 7.386249798), (-4.292177368, 7.386249798))
            Line((-4.292177368, 7.386249798), (-4.292177368, 7.886249798))
            Line((-4.292177368, 7.886249798), (-1.592177368, 7.886249798))
            ThreePointArc((-1.592177368, 7.886249798), (-1.380045334, 7.974117764), (-1.292177368, 8.186249798))
            Line((-1.292177368, 8.186249798), (-1.292177368, 8.636249798))
            Line((-1.292177368, 8.636249798), (1.707822632, 8.636249798))
            Line((1.707822632, 8.636249798), (1.707822632, 6.636249798))
        make_face()
    extrude(amount=SALIENTE_EXTRUIR7_2_DEPTH)


with BuildPart() as body_6:
    # Croquis10 → Saliente-Extruir7 3 (new body)
    with BuildSketch(Plane.XY.offset(1)):
        with BuildLine():
            Line((1.707822632, 1.636249798), (-1.292177368, 1.636249798))
            Line((-1.292177368, 1.636249798), (-1.292177368, 2.086249798))
            ThreePointArc((-1.292177368, 2.086249798), (-1.380045334, 2.298381833), (-1.592177368, 2.386249798))
            Line((-1.592177368, 2.386249798), (-4.292177368, 2.386249798))
            Line((-4.292177368, 2.386249798), (-4.292177368, 2.886249798))
            Line((-4.292177368, 2.886249798), (-1.592177368, 2.886249798))
            ThreePointArc((-1.592177368, 2.886249798), (-1.380045334, 2.974117764), (-1.292177368, 3.186249798))
            Line((-1.292177368, 3.186249798), (-1.292177368, 3.636249798))
            Line((-1.292177368, 3.636249798), (1.707822632, 3.636249798))
            Line((1.707822632, 3.636249798), (1.707822632, 1.636249798))
        make_face()
    extrude(amount=SALIENTE_EXTRUIR7_3_DEPTH)


with BuildPart() as cortar_extruir2_tool:
    # Croquis11 → Cortar-Extruir2 (new body, through all)
    with BuildSketch(Plane.XY.offset(1.3)):
        with Locations((0.925206345, 12.636249798)):
            Circle(CROQUIS11_R)
        with Locations((0.925206345, 7.636249798)):
            Circle(CROQUIS11_R)
        with Locations((0.925206345, 2.636249798)):
            Circle(CROQUIS11_R)
    extrude(amount=-CORTAR_EXTRUIR2_DEPTH)


with BuildPart() as part_1:
    add(part.part)

    # Cortar-Extruir2: cut by cortar_extruir2_tool
    add(cortar_extruir2_tool.part, mode=Mode.SUBTRACT)


with BuildPart() as body_4_1:
    add(body_4.part)

    # Cortar-Extruir2: cut by cortar_extruir2_tool
    add(cortar_extruir2_tool.part, mode=Mode.SUBTRACT)


with BuildPart() as body_5_1:
    add(body_5.part)

    # Cortar-Extruir2: cut by cortar_extruir2_tool
    add(cortar_extruir2_tool.part, mode=Mode.SUBTRACT)


with BuildPart() as body_6_1:
    add(body_6.part)

    # Cortar-Extruir2: cut by cortar_extruir2_tool
    add(cortar_extruir2_tool.part, mode=Mode.SUBTRACT)


solid = Compound([body_2.part, body_3.part, part_1.part, body_4_1.part, body_5_1.part, body_6_1.part])
